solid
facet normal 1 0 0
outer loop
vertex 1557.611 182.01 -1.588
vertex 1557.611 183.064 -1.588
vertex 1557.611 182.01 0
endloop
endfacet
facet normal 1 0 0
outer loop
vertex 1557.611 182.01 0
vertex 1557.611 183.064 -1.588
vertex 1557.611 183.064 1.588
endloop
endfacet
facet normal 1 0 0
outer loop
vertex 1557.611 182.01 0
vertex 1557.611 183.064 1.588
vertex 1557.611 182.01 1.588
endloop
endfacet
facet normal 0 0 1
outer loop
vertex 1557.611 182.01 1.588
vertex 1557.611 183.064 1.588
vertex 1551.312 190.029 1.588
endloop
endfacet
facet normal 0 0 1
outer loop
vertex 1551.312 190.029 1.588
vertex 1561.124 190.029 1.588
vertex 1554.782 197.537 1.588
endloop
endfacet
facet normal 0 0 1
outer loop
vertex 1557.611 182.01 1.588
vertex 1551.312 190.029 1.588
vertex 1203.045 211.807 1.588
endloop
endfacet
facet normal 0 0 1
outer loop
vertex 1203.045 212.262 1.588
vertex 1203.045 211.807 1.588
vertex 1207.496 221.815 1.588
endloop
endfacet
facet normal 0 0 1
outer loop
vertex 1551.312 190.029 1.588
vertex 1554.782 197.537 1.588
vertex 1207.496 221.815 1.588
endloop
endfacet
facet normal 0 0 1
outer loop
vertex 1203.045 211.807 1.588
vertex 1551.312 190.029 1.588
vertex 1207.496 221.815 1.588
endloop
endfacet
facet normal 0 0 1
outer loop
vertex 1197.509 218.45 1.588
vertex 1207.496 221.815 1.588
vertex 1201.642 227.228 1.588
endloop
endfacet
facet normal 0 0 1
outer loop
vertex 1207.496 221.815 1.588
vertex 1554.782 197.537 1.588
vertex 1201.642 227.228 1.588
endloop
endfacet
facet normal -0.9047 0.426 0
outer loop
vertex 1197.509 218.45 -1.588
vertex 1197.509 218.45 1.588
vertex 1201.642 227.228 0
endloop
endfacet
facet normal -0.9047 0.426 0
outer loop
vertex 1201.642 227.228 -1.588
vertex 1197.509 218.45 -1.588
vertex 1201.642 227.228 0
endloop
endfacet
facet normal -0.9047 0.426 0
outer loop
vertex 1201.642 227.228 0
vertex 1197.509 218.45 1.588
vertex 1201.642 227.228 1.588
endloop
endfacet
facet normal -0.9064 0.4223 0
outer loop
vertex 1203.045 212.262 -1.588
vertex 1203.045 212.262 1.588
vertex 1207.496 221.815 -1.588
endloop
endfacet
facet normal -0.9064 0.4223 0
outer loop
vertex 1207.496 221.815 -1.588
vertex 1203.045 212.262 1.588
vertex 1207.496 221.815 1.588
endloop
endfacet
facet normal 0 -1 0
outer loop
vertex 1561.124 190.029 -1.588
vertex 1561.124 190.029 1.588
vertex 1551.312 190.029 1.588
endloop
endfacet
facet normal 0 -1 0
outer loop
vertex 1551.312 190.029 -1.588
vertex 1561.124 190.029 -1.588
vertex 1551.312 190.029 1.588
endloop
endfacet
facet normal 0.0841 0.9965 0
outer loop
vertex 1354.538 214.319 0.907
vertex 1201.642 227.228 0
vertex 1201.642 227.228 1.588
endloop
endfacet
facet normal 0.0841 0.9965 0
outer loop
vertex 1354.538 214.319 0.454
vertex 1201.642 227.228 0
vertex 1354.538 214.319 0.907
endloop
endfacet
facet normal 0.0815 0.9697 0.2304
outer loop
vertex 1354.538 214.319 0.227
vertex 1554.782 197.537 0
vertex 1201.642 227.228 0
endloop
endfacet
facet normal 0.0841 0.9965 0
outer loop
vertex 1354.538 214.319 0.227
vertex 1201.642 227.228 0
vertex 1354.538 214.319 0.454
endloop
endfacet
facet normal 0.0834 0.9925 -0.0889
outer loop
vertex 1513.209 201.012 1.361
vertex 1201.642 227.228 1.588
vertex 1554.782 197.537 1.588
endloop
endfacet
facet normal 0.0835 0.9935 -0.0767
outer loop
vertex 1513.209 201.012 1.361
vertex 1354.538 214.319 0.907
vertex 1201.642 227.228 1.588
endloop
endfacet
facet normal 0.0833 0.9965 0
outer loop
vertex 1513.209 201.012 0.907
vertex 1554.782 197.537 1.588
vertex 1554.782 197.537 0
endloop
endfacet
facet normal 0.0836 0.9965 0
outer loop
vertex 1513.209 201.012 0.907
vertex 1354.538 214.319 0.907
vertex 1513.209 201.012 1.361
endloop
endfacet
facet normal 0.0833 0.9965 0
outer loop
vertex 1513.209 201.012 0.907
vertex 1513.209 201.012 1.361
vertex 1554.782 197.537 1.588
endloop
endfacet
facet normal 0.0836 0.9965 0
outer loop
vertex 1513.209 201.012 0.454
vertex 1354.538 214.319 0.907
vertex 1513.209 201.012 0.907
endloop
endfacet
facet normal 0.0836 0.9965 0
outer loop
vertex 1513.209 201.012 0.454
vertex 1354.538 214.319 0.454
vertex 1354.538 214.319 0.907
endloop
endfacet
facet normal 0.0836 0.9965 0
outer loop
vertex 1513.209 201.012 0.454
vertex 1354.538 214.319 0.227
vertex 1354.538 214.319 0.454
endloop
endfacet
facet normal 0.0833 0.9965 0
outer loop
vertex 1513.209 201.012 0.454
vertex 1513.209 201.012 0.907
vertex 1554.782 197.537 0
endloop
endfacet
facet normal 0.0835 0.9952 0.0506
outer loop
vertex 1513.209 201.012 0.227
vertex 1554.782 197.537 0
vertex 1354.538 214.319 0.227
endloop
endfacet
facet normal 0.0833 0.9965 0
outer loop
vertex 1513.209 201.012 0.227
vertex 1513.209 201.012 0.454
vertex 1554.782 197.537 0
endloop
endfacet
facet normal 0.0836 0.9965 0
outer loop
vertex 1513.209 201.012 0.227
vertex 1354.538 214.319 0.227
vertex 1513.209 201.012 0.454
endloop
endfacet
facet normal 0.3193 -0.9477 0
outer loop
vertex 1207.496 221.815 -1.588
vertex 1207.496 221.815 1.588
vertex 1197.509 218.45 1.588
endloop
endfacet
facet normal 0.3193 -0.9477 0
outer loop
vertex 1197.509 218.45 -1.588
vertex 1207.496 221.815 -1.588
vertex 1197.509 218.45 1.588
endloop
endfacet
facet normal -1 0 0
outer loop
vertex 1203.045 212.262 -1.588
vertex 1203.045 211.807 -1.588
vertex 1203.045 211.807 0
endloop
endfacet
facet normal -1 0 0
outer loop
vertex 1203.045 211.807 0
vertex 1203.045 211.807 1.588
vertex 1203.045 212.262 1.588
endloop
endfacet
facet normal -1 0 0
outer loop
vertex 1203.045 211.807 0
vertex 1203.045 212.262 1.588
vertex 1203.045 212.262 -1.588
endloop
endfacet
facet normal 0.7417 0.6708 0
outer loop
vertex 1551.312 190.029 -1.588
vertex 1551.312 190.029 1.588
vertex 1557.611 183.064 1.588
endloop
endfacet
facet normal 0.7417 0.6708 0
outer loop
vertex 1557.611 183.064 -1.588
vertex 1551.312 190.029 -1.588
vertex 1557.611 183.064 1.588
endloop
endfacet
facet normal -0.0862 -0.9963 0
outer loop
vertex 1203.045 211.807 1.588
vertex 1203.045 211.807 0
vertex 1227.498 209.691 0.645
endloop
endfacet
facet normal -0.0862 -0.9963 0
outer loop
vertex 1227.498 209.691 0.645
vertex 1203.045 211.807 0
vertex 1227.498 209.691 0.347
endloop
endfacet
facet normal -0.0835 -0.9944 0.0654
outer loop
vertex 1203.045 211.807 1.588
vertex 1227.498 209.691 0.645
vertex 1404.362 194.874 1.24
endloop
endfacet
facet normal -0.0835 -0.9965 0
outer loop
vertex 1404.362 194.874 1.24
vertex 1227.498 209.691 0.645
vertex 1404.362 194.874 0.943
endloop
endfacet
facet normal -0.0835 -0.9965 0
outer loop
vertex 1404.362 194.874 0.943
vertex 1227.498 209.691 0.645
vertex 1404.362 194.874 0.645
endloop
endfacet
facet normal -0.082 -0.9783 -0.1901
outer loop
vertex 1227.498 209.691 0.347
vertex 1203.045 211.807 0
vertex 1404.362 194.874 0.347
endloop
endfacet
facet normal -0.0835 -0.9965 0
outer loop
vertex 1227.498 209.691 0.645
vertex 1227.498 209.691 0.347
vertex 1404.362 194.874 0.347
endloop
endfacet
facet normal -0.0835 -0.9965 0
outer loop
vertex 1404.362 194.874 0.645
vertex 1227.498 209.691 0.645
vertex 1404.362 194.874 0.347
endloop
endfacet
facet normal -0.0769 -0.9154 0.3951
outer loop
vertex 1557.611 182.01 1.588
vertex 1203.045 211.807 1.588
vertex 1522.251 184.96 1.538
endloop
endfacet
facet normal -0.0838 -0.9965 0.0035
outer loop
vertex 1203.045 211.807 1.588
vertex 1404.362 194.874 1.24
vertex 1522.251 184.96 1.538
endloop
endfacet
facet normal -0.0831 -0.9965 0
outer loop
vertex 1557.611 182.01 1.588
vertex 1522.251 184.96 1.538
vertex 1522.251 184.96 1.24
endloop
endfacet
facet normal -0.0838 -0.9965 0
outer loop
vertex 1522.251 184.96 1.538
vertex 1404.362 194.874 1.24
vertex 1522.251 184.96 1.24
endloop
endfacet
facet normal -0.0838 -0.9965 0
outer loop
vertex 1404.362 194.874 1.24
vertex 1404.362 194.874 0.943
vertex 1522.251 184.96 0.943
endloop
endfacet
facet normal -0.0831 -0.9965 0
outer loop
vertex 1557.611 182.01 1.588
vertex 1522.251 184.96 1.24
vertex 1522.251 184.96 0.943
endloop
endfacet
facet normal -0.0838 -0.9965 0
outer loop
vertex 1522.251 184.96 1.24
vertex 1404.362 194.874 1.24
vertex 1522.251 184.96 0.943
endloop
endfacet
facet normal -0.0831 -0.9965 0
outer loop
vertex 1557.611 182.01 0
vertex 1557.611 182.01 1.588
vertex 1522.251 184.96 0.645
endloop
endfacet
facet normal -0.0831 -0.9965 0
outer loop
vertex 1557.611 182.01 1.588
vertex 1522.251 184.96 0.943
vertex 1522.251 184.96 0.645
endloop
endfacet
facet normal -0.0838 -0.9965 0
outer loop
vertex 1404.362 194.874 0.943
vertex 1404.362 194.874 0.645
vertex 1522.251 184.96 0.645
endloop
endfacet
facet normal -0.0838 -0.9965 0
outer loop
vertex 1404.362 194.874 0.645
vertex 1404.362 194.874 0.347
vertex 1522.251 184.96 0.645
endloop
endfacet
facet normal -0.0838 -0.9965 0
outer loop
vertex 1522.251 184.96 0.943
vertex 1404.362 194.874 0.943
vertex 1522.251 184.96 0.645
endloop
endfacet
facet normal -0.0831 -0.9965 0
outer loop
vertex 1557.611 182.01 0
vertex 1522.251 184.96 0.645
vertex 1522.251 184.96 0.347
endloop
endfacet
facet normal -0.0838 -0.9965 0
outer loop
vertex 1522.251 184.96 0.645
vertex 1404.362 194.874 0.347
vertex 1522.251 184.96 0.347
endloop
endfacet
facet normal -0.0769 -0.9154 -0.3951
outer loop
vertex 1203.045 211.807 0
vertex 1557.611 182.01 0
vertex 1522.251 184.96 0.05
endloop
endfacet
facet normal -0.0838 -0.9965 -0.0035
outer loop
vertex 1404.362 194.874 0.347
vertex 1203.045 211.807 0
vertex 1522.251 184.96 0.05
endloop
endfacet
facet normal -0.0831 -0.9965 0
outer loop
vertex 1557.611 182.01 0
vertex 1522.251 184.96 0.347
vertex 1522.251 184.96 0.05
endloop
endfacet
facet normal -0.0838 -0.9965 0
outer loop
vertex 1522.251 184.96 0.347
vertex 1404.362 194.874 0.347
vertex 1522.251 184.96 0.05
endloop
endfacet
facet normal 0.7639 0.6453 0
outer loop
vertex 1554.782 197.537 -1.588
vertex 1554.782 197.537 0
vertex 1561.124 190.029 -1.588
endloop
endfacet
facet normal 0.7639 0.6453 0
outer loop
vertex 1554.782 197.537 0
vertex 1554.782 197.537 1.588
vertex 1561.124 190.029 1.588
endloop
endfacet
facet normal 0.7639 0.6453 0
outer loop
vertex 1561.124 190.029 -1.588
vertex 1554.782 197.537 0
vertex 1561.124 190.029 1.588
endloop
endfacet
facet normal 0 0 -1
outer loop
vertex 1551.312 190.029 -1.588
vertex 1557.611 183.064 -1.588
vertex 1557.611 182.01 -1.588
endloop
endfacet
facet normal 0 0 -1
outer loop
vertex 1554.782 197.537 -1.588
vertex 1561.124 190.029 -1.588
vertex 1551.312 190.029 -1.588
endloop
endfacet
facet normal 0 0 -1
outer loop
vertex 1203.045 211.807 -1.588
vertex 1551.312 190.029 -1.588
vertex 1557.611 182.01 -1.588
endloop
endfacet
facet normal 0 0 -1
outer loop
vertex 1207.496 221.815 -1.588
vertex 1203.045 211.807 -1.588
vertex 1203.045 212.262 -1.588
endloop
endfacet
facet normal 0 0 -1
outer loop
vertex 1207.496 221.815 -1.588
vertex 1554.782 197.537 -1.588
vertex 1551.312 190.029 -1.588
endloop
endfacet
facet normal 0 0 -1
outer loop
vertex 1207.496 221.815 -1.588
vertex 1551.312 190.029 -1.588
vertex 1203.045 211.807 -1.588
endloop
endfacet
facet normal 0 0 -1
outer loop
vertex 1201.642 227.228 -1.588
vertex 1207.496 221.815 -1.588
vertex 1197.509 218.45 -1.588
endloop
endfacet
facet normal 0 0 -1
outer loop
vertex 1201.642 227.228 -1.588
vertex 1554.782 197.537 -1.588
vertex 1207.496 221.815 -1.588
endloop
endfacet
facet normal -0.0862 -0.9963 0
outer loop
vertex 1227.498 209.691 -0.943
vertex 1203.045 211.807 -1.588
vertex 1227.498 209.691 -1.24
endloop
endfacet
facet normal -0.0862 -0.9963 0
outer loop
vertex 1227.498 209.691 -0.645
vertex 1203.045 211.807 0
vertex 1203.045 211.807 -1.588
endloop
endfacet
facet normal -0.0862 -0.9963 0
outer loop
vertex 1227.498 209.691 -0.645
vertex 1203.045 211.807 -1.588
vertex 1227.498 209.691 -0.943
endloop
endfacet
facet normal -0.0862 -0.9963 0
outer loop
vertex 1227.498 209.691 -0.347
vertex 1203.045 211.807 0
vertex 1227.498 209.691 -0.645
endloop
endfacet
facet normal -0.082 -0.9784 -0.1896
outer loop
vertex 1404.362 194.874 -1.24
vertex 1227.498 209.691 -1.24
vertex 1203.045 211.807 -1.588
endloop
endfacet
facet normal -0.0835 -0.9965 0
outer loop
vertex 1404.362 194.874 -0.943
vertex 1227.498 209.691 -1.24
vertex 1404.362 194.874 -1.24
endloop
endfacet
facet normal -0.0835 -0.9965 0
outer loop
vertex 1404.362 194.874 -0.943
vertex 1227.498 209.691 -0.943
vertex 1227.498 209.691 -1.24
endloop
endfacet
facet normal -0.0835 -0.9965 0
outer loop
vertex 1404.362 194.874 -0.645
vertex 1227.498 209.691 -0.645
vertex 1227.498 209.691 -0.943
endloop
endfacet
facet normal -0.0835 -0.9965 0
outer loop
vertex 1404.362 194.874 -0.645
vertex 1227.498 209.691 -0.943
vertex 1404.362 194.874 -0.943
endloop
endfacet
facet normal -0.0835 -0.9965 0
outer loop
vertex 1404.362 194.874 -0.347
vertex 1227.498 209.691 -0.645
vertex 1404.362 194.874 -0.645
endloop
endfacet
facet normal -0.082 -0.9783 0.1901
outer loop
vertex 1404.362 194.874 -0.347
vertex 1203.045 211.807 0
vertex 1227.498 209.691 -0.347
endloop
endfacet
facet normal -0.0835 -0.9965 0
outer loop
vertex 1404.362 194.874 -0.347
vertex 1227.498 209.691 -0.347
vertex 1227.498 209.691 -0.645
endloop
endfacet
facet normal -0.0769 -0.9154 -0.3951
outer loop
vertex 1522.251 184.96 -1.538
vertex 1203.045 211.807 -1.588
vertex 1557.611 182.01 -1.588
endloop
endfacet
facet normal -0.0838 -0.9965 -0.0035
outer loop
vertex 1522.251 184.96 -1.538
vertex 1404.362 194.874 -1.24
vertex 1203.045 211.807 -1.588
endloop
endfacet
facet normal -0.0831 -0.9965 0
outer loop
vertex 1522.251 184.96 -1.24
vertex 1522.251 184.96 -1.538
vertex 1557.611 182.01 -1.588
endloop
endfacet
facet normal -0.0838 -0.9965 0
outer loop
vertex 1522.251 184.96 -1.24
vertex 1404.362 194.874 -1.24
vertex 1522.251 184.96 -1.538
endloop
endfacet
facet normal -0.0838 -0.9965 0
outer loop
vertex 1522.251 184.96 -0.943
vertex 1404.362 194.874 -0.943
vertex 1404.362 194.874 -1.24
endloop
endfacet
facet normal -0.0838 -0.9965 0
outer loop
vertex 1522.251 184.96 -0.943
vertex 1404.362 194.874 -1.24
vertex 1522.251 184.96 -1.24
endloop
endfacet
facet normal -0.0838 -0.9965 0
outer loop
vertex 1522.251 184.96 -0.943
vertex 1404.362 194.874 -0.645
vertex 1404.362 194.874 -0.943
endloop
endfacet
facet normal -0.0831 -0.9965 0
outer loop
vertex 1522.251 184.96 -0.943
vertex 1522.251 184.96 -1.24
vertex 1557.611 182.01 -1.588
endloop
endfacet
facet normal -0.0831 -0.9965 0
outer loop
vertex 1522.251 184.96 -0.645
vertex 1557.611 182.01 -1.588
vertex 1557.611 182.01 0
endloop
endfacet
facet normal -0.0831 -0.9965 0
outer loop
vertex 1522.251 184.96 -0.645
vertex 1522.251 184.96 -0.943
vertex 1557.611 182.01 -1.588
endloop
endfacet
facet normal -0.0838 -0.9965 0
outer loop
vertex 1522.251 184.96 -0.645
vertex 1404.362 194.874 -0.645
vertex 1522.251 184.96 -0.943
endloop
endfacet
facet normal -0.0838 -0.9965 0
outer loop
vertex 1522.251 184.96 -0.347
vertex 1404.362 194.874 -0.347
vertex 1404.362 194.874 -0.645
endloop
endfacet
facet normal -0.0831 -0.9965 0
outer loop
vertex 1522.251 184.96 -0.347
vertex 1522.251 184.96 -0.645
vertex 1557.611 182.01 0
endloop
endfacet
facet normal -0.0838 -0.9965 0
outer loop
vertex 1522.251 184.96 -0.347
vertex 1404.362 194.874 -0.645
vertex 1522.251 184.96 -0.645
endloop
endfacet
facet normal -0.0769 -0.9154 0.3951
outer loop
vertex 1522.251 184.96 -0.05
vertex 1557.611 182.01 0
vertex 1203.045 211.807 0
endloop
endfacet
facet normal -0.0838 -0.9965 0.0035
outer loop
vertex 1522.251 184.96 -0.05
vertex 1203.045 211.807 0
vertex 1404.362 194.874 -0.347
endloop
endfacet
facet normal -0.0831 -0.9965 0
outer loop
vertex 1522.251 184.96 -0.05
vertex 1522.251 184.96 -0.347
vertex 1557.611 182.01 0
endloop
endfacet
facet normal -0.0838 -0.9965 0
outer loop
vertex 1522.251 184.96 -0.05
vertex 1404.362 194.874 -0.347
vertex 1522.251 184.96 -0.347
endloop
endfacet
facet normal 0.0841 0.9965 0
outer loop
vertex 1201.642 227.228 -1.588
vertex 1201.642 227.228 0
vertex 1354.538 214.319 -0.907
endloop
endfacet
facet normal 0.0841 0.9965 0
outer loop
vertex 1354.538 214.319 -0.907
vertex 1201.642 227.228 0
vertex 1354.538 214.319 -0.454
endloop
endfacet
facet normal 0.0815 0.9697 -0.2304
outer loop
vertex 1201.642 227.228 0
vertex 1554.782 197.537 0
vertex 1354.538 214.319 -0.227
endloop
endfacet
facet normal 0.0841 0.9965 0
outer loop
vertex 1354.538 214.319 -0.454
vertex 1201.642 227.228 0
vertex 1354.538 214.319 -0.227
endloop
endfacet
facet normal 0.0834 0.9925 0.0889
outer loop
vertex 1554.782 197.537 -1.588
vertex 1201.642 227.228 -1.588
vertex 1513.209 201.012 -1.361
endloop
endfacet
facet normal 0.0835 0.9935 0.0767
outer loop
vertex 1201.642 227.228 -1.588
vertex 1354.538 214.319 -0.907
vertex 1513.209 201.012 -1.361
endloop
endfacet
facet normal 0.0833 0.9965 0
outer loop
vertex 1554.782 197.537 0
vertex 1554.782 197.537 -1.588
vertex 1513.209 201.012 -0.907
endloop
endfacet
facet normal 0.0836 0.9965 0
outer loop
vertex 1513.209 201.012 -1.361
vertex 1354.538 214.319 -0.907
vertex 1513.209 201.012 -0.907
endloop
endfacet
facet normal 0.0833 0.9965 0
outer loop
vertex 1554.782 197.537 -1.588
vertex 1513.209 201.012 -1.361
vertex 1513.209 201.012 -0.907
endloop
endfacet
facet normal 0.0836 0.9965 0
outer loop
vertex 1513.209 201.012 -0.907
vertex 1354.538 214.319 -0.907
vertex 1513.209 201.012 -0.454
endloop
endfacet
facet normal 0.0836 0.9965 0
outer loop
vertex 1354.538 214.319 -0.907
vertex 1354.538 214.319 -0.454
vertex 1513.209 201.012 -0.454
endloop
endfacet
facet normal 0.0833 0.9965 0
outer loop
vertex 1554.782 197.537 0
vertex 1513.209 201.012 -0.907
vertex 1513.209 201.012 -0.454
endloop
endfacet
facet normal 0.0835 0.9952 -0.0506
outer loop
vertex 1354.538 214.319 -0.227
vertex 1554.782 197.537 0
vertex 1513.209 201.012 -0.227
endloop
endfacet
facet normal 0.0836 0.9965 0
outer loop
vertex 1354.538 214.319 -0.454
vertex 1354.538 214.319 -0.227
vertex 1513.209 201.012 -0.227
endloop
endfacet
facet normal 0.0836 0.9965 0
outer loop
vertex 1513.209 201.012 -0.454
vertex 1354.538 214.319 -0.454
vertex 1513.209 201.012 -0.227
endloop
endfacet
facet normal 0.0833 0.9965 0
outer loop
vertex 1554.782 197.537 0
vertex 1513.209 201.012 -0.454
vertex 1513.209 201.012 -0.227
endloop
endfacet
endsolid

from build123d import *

# Parameters (mm, degrees)
BOSS_EXTRUDE1_DEPTH = 1.5875
FILLET1_R           = 2.54
CUT_EXTRUDE1_DEPTH  = 7.62


with BuildPart() as part:
    # Sketch2 → Boss-Extrude1 (new body, symmetric)
    with BuildSketch(Plane.XY):
        with BuildLine():
            add(Edge.make_bspline(
                [(825.5, 263.72872798), (833.004293944, 262.763036085), (840.535916247, 261.846014478), (848.126574562, 260.964164828), (892.90639318, 255.945629274), (937.686211733, 251.779150949), (973.452075064, 248.227669425), (1071.946672141, 239.051054038), (1170.441269319, 229.731506738), (1231.791940344, 224.503945813), (1324.899336146, 216.790627817), (1418.006730935, 209.040117978), (1449.742935921, 206.361809936), (1636.928606778, 190.521130342), (1824.114277635, 175.409157235), (1979.966947376, 164.299650253), (2156.268639429, 150.414433314), (2332.570330468, 133.857216402), (2354.212983157, 131.78508222), (2394.341467798, 127.847039259), (2434.469952439, 123.717187755), (2453.57670361, 121.704562273), (2472.669581058, 119.647220503), (2491.74, 117.547195763)],
                knots=[78.681340958, 78.681340958, 78.681340958, 78.681340958, 78.681340958, 78.681340958, 82.46579272, 82.46579272, 82.46579272, 100.7932901, 100.7932901, 100.7932901, 131.0989539, 131.0989539, 131.0989539, 146.7691983, 146.7691983, 146.7691983, 223.5339586, 223.5339586, 223.5339586, 233.9431167, 233.9431167, 233.9431167, 243.40815085, 243.40815085, 243.40815085, 243.40815085, 243.40815085, 243.40815085], degree=5))
            Line((825.5, 263.72872798), (825.5, 248.364439806))
            add(Edge.make_bspline(
                [(825.5, 248.364439806), (827.20768691, 248.14708351), (833.784664511, 247.321927102), (845.28106727, 245.953419483), (860.086531547, 244.295598067), (879.830703434, 242.186646028), (904.369967092, 239.698279806), (933.571022669, 236.832150625), (962.642718041, 234.023667741), (991.762593943, 231.241975908), (1021.072010315, 228.475862291), (1060.376437315, 224.796956681), (1109.513015577, 220.184378862), (1168.511190361, 214.817071985), (1227.500129793, 209.662054042), (1306.133167947, 203.021178328), (1404.361477105, 194.920725932), (1522.239851071, 184.918066624), (1640.182856491, 175.167007786), (1758.165352567, 165.757639485), (1876.155384769, 156.590937079), (1994.08749188, 147.453250142), (2092.268692061, 139.624216053), (2170.748029042, 133.079656729), (2219.771730977, 128.842227836), (2258.983988247, 125.347211495), (2288.379457536, 122.670854497), (2317.812243116, 119.931729386), (2347.551509172, 117.100365283), (2377.159899727, 114.21011853), (2406.469653851, 111.26896801), (2435.81832606, 108.240091266), (2464.242715806, 105.222889554), (2482.876892709, 103.192325927), (2491.74, 102.214848055)],
                knots=[78.875303138, 78.875303138, 78.875303138, 78.875303138, 79.386176103, 80.841530691, 82.29688528, 83.752239868, 86.662949044, 89.57365822, 92.484367397, 95.395076573, 98.305785749, 101.216494926, 107.037913278, 112.859331631, 118.680749984, 124.502168336, 136.145005042, 147.787841747, 159.430678452, 171.073515158, 182.716351863, 194.359188568, 206.002025273, 211.823443626, 217.644861979, 220.555571155, 223.466280331, 226.376989508, 229.287698684, 232.19840786, 235.109117037, 238.019826213, 240.930535389, 243.57402126, 243.57402126, 243.57402126, 243.57402126], degree=3))
            Line((2491.74, 102.214848055), (2491.74, 117.547195763))
        make_face()
    extrude(amount=BOSS_EXTRUDE1_DEPTH, both=True)

    # Fillet1
    fillet1_edges = [part.edges().sort_by_distance(p)[0] for p in [
        (2491.74, 102.214848055, -0.79375),
        (2491.74, 117.547195763, -0.79375),
        (825.5, 248.364439806, -0.79375),
        (825.5, 263.72872798, 0.79375),
    ]]
    fillet(fillet1_edges, radius=FILLET1_R)

    # Sketch3 → Cut-Extrude1 (cut)
    with BuildSketch(Plane.XY.offset(1.5875)):
        Polygon((1201.641901464, 227.227804562), (1201.641901464, 234.542162162), (821.218059657, 281.929544487), (821.218059657, 218.449722533), (1203.044971141, 207.573021892), (1203.044971141, 212.261982037), (1207.495802024, 221.814984909), (1197.508571749, 218.449722533), align=None)
        Polygon((1554.781712943, 197.53701635), (1561.124210439, 190.02917074), (1551.311808982, 190.02917074), (1557.611128436, 183.063577113), (1557.611128436, 178.064185516), (2509.688563149, 67.607566775), (2509.688563149, 142.671449404), (1554.781712943, 201.416206561), align=None)
    extrude(amount=-CUT_EXTRUDE1_DEPTH, mode=Mode.SUBTRACT)


solid = part.part
